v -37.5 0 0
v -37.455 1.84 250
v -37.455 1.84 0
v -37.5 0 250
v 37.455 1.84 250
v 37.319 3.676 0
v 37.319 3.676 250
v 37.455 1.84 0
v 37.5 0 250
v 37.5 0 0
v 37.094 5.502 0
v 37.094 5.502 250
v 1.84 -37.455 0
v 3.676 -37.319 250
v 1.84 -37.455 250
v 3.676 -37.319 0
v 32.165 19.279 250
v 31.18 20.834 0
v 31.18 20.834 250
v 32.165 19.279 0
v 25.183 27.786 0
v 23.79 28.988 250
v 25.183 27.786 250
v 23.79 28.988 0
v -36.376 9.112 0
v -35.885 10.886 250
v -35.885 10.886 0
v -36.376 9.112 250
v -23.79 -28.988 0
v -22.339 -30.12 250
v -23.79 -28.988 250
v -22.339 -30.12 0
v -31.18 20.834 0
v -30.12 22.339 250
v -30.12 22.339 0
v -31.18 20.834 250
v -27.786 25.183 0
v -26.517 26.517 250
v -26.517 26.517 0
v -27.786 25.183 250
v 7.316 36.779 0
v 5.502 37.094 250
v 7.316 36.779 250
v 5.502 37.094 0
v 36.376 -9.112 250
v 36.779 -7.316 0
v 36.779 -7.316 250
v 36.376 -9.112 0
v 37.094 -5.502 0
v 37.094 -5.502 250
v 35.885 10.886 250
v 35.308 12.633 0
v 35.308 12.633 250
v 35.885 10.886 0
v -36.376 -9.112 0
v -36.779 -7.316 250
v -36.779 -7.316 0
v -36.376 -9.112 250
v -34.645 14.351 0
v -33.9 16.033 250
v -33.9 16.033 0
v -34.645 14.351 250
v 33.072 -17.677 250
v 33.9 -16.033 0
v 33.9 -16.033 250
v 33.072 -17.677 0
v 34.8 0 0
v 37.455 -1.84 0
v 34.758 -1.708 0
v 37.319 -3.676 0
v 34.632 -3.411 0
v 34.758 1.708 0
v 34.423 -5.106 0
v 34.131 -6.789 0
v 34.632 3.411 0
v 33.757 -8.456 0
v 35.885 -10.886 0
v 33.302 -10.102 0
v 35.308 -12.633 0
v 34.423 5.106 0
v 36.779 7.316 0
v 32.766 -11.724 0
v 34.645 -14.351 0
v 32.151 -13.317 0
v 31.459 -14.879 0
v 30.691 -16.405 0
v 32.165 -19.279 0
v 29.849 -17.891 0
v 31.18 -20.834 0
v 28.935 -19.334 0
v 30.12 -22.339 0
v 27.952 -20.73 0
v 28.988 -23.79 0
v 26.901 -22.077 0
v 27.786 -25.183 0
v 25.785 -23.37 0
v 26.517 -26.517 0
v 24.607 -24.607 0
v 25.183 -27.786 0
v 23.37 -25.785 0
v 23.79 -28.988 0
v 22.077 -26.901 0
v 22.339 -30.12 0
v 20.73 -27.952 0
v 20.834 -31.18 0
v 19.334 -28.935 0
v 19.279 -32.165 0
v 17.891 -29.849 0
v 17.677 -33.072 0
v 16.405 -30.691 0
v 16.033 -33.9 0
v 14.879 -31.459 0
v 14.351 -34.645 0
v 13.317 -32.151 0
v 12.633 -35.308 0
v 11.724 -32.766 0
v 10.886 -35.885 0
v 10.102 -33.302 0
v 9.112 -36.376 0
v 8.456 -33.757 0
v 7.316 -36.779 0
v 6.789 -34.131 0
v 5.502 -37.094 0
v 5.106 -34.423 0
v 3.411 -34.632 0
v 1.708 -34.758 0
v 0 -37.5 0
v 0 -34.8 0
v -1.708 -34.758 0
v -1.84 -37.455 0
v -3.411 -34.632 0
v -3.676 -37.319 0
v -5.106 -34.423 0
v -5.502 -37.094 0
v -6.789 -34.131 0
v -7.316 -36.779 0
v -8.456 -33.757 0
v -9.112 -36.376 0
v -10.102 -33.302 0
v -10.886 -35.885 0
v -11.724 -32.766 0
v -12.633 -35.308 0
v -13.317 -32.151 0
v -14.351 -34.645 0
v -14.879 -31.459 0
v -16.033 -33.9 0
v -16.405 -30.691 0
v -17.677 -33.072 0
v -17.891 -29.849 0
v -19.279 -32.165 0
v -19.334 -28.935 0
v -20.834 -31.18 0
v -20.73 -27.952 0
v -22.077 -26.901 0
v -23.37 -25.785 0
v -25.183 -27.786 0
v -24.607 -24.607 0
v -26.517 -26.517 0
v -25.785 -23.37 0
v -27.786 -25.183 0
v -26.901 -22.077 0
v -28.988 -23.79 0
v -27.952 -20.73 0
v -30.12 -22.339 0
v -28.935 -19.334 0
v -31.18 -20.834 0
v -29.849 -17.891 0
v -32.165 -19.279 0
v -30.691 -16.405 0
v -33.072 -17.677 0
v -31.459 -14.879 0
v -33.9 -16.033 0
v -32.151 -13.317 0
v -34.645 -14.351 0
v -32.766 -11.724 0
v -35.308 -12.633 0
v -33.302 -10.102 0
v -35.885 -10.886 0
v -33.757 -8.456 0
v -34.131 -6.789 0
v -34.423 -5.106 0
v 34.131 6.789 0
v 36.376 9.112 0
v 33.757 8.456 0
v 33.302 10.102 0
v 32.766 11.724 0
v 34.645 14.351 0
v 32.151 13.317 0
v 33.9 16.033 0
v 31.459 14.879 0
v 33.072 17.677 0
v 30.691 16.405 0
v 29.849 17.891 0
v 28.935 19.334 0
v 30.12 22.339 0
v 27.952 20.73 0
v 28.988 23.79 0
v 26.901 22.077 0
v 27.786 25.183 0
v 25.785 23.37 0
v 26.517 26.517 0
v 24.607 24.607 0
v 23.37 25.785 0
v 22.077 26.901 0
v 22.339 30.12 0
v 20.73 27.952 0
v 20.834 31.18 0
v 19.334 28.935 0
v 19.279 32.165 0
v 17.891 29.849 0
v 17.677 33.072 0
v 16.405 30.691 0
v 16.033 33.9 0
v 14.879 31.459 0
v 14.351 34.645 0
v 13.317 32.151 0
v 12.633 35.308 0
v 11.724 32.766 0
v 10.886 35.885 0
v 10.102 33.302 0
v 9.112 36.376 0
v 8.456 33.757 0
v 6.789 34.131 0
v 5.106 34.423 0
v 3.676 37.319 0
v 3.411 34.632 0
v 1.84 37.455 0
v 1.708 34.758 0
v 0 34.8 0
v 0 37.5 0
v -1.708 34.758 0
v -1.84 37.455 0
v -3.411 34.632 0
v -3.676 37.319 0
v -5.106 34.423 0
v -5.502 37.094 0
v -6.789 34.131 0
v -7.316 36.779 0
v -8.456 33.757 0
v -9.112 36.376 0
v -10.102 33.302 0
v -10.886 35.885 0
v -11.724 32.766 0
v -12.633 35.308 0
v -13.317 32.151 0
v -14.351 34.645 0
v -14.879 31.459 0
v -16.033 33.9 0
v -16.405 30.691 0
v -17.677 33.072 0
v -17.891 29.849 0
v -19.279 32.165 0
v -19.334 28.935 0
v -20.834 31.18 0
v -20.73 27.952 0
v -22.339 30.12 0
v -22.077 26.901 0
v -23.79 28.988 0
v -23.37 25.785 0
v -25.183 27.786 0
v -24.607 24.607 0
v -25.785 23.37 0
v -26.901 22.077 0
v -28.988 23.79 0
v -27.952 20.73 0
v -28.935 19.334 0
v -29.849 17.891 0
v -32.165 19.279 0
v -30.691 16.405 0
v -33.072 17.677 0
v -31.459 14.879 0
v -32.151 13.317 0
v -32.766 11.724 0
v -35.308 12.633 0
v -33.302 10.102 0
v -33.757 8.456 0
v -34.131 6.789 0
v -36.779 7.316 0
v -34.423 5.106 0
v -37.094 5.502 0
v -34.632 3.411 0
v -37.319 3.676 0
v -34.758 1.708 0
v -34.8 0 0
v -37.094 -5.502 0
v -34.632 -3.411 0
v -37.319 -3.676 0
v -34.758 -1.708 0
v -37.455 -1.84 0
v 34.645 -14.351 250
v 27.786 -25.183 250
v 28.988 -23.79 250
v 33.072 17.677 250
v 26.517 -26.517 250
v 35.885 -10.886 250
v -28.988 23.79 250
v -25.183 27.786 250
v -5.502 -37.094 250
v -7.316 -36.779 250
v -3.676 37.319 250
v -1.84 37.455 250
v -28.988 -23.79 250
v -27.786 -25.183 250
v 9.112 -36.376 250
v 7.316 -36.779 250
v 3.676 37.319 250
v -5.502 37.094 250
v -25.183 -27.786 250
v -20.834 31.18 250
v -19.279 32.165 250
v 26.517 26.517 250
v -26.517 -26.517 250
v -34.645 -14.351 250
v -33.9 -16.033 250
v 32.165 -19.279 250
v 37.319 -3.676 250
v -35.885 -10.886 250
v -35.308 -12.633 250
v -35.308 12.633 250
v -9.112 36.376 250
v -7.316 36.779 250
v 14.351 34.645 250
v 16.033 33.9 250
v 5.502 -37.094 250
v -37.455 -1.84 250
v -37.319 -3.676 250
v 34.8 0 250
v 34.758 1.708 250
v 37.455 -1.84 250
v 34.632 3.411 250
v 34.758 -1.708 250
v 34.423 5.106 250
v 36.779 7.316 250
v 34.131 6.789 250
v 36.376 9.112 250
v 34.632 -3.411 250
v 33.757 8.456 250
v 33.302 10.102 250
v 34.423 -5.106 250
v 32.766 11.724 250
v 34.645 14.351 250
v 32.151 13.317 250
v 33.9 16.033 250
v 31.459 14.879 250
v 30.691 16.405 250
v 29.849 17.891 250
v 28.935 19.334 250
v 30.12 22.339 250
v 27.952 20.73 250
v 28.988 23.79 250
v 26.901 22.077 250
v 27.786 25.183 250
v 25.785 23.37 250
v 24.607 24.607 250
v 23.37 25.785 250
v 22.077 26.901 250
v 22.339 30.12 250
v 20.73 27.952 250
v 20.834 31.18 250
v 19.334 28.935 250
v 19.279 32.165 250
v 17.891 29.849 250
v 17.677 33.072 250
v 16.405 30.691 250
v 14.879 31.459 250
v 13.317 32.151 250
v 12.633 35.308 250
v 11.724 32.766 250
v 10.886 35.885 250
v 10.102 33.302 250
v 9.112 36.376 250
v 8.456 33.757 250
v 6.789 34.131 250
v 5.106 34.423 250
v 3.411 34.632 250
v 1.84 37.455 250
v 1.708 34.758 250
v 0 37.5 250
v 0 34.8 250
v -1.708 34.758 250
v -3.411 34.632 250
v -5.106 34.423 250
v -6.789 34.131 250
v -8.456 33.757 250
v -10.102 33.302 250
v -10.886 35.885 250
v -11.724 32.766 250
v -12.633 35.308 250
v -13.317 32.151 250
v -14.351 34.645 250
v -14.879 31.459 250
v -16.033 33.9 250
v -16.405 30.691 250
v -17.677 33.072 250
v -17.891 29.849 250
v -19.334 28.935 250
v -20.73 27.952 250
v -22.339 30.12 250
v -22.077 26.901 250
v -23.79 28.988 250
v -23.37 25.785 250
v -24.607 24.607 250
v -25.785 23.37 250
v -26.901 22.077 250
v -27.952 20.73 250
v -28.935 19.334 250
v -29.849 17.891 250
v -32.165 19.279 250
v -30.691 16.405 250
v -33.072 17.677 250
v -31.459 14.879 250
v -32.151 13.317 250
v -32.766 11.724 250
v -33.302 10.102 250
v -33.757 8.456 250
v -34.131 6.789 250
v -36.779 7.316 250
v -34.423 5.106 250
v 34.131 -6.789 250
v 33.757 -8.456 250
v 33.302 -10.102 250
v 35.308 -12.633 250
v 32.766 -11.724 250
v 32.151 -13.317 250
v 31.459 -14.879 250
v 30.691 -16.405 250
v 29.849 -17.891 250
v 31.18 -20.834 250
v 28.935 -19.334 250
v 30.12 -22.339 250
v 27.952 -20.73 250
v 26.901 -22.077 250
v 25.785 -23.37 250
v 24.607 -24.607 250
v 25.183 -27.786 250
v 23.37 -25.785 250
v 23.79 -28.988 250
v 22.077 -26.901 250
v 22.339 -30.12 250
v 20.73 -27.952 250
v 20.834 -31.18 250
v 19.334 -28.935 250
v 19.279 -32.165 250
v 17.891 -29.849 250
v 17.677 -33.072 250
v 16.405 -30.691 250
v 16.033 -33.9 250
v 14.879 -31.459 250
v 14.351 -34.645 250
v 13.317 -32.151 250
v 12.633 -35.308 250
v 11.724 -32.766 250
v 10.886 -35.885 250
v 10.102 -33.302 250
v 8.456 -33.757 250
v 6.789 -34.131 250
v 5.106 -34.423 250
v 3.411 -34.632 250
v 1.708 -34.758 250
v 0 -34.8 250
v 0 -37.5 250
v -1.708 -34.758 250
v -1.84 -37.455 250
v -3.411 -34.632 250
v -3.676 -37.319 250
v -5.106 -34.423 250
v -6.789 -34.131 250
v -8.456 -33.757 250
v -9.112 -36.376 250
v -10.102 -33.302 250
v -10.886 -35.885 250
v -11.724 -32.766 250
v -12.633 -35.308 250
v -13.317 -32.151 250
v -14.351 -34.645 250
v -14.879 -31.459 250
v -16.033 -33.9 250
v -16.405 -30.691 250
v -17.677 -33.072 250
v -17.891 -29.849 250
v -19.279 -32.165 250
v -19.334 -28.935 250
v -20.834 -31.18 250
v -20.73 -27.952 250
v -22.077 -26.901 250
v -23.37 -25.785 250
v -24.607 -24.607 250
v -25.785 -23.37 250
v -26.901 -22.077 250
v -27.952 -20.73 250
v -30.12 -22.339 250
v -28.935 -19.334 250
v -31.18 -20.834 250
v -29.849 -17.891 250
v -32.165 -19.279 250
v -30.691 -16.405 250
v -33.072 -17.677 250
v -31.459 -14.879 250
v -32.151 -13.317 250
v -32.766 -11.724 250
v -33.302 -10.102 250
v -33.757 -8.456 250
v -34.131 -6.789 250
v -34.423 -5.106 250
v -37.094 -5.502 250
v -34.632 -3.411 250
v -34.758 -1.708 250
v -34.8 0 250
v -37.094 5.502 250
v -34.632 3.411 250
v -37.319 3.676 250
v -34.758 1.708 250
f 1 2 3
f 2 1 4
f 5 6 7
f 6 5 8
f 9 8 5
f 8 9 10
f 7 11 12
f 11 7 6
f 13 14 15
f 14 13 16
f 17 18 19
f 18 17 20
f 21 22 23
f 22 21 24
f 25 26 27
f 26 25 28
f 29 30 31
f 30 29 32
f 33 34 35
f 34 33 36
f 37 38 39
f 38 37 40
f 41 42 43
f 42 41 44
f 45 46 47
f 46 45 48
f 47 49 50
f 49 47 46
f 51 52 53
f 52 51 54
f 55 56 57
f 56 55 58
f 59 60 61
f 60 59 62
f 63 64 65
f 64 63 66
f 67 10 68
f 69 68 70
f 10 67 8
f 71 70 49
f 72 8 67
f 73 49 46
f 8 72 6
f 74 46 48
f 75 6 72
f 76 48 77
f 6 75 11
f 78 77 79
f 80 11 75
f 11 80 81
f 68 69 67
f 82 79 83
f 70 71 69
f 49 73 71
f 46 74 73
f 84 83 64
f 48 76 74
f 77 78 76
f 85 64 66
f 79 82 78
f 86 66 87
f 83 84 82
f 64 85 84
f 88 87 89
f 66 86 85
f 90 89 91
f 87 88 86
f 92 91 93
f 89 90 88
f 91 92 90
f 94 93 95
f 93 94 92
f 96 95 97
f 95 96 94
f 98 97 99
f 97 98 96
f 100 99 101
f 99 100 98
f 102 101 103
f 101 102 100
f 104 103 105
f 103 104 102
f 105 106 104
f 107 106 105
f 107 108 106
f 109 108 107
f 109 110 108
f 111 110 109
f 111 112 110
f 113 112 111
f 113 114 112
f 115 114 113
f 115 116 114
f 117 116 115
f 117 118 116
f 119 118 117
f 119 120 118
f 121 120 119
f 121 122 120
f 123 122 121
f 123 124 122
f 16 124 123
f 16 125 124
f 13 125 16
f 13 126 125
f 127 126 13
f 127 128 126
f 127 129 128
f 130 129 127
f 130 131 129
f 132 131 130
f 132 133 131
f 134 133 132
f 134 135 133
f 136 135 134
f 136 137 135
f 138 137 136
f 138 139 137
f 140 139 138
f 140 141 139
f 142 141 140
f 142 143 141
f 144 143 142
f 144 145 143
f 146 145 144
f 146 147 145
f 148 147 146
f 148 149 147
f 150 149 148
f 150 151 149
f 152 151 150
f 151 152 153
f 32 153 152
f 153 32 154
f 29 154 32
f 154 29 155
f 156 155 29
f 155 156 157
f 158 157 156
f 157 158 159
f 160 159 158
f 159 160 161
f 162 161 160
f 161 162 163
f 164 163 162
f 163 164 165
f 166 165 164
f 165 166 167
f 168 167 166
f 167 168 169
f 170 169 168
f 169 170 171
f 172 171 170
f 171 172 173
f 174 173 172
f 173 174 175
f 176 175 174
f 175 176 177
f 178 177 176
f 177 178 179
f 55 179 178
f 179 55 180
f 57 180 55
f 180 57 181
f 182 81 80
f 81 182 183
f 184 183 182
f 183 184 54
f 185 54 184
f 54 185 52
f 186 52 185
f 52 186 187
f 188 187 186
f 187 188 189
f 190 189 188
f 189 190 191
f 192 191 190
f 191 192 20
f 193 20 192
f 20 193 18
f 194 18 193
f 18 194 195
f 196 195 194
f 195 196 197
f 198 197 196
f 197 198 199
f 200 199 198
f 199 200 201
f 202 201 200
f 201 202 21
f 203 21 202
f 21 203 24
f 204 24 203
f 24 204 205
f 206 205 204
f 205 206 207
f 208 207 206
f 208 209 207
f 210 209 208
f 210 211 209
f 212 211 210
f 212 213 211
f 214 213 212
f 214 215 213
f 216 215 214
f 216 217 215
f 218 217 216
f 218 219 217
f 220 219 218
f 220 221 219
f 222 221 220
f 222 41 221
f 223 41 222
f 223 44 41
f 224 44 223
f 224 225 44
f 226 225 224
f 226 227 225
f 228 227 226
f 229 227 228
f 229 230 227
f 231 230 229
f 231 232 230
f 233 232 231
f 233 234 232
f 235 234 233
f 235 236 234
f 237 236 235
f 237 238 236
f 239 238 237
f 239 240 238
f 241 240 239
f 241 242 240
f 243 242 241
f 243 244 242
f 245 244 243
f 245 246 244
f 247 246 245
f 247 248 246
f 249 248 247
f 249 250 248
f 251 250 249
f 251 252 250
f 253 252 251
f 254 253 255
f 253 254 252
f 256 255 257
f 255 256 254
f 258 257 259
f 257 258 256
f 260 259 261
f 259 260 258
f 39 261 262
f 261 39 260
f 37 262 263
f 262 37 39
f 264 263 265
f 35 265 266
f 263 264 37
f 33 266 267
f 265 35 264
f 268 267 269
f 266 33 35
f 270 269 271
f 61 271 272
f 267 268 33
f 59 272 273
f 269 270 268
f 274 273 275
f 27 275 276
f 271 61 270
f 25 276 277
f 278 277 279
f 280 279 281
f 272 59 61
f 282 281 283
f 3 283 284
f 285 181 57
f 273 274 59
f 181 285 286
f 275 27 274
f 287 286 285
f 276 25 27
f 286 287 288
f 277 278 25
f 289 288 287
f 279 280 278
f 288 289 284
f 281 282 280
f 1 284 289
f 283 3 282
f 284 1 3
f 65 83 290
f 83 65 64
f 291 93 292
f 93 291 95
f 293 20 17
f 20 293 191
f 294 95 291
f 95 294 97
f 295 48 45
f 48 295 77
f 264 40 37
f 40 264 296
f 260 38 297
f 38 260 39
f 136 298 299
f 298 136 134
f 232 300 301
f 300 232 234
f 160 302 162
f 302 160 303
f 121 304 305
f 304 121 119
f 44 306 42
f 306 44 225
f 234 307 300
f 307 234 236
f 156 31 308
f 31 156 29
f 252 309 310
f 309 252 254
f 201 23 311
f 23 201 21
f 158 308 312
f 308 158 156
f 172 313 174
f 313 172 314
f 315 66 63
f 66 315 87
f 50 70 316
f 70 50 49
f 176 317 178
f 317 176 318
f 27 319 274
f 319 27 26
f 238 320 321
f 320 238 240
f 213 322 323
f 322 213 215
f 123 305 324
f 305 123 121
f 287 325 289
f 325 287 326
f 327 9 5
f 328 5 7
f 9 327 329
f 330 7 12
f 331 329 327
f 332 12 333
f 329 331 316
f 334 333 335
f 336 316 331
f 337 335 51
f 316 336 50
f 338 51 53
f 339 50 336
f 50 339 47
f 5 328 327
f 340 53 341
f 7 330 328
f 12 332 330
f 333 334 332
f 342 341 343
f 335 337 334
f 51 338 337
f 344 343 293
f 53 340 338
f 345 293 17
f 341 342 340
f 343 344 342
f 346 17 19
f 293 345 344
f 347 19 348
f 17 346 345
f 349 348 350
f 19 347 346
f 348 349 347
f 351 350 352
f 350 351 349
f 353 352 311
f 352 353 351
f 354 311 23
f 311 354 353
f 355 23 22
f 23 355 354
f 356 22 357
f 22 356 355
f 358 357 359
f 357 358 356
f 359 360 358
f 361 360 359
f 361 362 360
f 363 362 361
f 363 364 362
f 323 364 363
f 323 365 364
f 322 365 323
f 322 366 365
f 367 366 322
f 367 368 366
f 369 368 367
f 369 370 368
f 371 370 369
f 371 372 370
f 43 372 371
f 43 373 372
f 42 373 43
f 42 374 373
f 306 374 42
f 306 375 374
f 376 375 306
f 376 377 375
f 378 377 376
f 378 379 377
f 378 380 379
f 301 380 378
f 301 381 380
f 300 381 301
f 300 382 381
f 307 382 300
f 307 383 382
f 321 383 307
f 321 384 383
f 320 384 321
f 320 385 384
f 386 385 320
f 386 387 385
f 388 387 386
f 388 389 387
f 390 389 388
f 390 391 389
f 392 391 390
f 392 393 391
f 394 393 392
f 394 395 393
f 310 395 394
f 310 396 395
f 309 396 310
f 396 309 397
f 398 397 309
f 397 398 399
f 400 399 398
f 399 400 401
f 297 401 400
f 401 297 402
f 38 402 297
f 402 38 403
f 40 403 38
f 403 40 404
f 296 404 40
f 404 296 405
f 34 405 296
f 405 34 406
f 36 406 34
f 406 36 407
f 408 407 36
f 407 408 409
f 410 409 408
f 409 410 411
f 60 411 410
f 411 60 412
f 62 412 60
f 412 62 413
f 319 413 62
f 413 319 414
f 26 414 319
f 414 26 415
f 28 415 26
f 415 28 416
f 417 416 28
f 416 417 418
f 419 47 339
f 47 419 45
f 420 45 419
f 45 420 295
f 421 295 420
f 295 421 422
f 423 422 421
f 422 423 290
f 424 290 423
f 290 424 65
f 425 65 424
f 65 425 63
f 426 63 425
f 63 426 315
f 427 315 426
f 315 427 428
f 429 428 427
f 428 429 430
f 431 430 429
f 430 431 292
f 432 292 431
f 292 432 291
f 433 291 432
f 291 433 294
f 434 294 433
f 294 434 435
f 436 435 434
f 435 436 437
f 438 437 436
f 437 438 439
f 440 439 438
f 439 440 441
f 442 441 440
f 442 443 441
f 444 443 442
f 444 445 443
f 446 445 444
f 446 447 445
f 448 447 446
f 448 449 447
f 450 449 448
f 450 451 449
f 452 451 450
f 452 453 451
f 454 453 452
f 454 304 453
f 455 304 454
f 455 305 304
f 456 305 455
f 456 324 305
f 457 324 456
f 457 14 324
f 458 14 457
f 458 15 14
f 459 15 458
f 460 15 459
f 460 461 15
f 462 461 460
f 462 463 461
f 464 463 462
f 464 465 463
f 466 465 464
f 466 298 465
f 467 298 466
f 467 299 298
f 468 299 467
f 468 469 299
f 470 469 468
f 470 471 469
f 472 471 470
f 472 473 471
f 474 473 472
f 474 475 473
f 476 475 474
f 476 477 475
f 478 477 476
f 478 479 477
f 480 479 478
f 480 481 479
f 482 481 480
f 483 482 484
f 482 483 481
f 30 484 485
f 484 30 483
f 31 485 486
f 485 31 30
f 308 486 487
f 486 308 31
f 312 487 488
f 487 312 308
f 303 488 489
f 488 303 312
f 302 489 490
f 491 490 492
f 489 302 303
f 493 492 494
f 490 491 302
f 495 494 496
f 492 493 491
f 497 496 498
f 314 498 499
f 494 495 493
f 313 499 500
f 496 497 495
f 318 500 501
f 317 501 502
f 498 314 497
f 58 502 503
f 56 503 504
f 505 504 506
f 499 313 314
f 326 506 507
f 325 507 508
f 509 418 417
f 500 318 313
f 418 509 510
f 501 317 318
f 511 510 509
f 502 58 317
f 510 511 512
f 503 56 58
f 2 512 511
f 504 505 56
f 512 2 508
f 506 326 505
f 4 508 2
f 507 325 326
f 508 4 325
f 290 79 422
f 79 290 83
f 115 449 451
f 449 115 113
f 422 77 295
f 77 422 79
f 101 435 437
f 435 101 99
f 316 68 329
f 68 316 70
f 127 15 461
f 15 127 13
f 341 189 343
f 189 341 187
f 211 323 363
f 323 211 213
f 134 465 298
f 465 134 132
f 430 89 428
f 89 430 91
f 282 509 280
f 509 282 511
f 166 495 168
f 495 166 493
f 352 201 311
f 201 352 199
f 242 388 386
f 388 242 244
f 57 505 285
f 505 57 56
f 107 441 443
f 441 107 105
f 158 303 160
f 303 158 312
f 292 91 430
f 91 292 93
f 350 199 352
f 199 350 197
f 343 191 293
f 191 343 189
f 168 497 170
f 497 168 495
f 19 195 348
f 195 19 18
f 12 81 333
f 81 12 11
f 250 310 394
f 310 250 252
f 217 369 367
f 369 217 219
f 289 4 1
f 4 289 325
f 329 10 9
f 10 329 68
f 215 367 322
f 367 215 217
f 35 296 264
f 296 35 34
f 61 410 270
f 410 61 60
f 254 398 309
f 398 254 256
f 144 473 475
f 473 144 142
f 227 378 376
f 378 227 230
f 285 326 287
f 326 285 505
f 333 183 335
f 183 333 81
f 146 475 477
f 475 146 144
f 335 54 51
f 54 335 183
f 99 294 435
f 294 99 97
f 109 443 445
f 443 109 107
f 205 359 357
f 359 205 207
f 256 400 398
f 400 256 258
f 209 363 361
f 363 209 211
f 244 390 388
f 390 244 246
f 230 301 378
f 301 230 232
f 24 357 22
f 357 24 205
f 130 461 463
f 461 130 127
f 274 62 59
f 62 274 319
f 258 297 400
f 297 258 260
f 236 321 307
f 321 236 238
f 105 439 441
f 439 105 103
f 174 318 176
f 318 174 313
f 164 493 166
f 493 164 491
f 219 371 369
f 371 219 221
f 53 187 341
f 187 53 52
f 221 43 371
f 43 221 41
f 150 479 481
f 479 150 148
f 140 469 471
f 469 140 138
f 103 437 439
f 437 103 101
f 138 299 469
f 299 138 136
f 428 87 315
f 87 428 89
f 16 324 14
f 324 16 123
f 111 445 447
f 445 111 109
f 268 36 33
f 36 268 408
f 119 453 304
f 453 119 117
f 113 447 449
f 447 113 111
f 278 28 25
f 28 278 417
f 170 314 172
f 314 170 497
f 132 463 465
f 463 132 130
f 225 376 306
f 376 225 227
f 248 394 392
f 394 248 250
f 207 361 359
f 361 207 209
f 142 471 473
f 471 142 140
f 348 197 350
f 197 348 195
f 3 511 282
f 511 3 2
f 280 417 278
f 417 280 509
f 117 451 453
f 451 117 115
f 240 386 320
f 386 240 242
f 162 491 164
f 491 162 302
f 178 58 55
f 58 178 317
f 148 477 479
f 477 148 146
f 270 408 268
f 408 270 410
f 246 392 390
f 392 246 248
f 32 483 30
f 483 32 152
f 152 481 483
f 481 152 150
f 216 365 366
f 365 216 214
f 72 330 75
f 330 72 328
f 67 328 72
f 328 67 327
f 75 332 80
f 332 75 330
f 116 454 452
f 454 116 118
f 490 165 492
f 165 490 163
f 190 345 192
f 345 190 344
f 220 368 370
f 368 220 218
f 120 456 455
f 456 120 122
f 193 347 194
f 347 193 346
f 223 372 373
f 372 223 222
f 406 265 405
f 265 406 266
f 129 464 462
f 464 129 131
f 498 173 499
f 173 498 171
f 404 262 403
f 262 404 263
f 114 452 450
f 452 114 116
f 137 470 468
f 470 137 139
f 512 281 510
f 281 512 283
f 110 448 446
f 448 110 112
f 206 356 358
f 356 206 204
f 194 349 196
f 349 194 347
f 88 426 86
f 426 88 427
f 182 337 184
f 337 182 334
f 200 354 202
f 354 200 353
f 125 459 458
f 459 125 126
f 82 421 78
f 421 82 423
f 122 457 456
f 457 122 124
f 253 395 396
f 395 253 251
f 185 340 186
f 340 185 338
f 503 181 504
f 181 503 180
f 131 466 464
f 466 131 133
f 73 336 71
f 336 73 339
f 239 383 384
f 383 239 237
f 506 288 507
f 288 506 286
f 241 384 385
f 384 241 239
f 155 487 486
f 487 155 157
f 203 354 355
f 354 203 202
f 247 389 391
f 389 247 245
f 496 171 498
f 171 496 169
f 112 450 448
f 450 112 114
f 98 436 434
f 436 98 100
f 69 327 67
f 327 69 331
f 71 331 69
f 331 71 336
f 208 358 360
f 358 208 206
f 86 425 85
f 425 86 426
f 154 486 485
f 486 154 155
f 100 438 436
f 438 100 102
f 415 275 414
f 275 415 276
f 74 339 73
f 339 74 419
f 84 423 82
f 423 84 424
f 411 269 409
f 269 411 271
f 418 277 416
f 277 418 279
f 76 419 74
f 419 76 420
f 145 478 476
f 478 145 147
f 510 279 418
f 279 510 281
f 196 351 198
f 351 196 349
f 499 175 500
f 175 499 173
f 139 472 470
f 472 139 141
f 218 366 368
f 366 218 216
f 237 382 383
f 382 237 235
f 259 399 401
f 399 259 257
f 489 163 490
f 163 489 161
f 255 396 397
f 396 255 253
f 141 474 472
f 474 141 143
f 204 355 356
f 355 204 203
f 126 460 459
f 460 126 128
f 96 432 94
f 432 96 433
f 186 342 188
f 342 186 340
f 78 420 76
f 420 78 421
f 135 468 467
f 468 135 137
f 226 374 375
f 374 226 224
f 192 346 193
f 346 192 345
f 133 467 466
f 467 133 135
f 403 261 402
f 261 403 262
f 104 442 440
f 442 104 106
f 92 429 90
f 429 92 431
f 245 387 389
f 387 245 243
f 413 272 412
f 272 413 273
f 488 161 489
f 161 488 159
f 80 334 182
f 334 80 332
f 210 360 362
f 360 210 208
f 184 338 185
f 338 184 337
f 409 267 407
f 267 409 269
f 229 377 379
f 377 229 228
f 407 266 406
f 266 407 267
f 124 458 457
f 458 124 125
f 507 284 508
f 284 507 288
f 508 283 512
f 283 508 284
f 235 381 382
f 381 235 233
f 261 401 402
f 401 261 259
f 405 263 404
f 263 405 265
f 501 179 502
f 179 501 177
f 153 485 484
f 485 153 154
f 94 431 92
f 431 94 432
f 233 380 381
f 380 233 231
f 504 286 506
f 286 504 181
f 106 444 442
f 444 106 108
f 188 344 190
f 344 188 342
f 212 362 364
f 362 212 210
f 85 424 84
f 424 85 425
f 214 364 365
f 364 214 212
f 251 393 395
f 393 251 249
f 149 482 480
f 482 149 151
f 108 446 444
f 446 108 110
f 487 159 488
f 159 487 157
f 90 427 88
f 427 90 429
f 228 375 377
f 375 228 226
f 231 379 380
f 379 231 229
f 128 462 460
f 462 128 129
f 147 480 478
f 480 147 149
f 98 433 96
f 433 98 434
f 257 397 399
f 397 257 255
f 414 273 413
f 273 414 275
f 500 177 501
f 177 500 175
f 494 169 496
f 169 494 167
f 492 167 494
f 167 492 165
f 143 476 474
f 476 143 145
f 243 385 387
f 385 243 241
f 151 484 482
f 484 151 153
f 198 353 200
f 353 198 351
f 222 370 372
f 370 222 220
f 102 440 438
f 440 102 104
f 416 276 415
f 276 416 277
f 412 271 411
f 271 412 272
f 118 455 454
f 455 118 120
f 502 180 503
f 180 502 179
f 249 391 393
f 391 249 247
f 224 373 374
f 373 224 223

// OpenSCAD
$fn = 128;

// HT pipe parameters (approximate, in mm)
od = 75;          // outer diameter
len = 250;        // length
wall = 2.7;       // typical HT 75 wall thickness (approx.)
id = od - 2*wall; // inner diameter

module ht_pipe(od, id, len) {
    difference() {
        cylinder(h = len, d = od);
        translate([0,0,-0.1]) cylinder(h = len + 0.2, d = id);
    }
}

ht_pipe(od, id, len);
